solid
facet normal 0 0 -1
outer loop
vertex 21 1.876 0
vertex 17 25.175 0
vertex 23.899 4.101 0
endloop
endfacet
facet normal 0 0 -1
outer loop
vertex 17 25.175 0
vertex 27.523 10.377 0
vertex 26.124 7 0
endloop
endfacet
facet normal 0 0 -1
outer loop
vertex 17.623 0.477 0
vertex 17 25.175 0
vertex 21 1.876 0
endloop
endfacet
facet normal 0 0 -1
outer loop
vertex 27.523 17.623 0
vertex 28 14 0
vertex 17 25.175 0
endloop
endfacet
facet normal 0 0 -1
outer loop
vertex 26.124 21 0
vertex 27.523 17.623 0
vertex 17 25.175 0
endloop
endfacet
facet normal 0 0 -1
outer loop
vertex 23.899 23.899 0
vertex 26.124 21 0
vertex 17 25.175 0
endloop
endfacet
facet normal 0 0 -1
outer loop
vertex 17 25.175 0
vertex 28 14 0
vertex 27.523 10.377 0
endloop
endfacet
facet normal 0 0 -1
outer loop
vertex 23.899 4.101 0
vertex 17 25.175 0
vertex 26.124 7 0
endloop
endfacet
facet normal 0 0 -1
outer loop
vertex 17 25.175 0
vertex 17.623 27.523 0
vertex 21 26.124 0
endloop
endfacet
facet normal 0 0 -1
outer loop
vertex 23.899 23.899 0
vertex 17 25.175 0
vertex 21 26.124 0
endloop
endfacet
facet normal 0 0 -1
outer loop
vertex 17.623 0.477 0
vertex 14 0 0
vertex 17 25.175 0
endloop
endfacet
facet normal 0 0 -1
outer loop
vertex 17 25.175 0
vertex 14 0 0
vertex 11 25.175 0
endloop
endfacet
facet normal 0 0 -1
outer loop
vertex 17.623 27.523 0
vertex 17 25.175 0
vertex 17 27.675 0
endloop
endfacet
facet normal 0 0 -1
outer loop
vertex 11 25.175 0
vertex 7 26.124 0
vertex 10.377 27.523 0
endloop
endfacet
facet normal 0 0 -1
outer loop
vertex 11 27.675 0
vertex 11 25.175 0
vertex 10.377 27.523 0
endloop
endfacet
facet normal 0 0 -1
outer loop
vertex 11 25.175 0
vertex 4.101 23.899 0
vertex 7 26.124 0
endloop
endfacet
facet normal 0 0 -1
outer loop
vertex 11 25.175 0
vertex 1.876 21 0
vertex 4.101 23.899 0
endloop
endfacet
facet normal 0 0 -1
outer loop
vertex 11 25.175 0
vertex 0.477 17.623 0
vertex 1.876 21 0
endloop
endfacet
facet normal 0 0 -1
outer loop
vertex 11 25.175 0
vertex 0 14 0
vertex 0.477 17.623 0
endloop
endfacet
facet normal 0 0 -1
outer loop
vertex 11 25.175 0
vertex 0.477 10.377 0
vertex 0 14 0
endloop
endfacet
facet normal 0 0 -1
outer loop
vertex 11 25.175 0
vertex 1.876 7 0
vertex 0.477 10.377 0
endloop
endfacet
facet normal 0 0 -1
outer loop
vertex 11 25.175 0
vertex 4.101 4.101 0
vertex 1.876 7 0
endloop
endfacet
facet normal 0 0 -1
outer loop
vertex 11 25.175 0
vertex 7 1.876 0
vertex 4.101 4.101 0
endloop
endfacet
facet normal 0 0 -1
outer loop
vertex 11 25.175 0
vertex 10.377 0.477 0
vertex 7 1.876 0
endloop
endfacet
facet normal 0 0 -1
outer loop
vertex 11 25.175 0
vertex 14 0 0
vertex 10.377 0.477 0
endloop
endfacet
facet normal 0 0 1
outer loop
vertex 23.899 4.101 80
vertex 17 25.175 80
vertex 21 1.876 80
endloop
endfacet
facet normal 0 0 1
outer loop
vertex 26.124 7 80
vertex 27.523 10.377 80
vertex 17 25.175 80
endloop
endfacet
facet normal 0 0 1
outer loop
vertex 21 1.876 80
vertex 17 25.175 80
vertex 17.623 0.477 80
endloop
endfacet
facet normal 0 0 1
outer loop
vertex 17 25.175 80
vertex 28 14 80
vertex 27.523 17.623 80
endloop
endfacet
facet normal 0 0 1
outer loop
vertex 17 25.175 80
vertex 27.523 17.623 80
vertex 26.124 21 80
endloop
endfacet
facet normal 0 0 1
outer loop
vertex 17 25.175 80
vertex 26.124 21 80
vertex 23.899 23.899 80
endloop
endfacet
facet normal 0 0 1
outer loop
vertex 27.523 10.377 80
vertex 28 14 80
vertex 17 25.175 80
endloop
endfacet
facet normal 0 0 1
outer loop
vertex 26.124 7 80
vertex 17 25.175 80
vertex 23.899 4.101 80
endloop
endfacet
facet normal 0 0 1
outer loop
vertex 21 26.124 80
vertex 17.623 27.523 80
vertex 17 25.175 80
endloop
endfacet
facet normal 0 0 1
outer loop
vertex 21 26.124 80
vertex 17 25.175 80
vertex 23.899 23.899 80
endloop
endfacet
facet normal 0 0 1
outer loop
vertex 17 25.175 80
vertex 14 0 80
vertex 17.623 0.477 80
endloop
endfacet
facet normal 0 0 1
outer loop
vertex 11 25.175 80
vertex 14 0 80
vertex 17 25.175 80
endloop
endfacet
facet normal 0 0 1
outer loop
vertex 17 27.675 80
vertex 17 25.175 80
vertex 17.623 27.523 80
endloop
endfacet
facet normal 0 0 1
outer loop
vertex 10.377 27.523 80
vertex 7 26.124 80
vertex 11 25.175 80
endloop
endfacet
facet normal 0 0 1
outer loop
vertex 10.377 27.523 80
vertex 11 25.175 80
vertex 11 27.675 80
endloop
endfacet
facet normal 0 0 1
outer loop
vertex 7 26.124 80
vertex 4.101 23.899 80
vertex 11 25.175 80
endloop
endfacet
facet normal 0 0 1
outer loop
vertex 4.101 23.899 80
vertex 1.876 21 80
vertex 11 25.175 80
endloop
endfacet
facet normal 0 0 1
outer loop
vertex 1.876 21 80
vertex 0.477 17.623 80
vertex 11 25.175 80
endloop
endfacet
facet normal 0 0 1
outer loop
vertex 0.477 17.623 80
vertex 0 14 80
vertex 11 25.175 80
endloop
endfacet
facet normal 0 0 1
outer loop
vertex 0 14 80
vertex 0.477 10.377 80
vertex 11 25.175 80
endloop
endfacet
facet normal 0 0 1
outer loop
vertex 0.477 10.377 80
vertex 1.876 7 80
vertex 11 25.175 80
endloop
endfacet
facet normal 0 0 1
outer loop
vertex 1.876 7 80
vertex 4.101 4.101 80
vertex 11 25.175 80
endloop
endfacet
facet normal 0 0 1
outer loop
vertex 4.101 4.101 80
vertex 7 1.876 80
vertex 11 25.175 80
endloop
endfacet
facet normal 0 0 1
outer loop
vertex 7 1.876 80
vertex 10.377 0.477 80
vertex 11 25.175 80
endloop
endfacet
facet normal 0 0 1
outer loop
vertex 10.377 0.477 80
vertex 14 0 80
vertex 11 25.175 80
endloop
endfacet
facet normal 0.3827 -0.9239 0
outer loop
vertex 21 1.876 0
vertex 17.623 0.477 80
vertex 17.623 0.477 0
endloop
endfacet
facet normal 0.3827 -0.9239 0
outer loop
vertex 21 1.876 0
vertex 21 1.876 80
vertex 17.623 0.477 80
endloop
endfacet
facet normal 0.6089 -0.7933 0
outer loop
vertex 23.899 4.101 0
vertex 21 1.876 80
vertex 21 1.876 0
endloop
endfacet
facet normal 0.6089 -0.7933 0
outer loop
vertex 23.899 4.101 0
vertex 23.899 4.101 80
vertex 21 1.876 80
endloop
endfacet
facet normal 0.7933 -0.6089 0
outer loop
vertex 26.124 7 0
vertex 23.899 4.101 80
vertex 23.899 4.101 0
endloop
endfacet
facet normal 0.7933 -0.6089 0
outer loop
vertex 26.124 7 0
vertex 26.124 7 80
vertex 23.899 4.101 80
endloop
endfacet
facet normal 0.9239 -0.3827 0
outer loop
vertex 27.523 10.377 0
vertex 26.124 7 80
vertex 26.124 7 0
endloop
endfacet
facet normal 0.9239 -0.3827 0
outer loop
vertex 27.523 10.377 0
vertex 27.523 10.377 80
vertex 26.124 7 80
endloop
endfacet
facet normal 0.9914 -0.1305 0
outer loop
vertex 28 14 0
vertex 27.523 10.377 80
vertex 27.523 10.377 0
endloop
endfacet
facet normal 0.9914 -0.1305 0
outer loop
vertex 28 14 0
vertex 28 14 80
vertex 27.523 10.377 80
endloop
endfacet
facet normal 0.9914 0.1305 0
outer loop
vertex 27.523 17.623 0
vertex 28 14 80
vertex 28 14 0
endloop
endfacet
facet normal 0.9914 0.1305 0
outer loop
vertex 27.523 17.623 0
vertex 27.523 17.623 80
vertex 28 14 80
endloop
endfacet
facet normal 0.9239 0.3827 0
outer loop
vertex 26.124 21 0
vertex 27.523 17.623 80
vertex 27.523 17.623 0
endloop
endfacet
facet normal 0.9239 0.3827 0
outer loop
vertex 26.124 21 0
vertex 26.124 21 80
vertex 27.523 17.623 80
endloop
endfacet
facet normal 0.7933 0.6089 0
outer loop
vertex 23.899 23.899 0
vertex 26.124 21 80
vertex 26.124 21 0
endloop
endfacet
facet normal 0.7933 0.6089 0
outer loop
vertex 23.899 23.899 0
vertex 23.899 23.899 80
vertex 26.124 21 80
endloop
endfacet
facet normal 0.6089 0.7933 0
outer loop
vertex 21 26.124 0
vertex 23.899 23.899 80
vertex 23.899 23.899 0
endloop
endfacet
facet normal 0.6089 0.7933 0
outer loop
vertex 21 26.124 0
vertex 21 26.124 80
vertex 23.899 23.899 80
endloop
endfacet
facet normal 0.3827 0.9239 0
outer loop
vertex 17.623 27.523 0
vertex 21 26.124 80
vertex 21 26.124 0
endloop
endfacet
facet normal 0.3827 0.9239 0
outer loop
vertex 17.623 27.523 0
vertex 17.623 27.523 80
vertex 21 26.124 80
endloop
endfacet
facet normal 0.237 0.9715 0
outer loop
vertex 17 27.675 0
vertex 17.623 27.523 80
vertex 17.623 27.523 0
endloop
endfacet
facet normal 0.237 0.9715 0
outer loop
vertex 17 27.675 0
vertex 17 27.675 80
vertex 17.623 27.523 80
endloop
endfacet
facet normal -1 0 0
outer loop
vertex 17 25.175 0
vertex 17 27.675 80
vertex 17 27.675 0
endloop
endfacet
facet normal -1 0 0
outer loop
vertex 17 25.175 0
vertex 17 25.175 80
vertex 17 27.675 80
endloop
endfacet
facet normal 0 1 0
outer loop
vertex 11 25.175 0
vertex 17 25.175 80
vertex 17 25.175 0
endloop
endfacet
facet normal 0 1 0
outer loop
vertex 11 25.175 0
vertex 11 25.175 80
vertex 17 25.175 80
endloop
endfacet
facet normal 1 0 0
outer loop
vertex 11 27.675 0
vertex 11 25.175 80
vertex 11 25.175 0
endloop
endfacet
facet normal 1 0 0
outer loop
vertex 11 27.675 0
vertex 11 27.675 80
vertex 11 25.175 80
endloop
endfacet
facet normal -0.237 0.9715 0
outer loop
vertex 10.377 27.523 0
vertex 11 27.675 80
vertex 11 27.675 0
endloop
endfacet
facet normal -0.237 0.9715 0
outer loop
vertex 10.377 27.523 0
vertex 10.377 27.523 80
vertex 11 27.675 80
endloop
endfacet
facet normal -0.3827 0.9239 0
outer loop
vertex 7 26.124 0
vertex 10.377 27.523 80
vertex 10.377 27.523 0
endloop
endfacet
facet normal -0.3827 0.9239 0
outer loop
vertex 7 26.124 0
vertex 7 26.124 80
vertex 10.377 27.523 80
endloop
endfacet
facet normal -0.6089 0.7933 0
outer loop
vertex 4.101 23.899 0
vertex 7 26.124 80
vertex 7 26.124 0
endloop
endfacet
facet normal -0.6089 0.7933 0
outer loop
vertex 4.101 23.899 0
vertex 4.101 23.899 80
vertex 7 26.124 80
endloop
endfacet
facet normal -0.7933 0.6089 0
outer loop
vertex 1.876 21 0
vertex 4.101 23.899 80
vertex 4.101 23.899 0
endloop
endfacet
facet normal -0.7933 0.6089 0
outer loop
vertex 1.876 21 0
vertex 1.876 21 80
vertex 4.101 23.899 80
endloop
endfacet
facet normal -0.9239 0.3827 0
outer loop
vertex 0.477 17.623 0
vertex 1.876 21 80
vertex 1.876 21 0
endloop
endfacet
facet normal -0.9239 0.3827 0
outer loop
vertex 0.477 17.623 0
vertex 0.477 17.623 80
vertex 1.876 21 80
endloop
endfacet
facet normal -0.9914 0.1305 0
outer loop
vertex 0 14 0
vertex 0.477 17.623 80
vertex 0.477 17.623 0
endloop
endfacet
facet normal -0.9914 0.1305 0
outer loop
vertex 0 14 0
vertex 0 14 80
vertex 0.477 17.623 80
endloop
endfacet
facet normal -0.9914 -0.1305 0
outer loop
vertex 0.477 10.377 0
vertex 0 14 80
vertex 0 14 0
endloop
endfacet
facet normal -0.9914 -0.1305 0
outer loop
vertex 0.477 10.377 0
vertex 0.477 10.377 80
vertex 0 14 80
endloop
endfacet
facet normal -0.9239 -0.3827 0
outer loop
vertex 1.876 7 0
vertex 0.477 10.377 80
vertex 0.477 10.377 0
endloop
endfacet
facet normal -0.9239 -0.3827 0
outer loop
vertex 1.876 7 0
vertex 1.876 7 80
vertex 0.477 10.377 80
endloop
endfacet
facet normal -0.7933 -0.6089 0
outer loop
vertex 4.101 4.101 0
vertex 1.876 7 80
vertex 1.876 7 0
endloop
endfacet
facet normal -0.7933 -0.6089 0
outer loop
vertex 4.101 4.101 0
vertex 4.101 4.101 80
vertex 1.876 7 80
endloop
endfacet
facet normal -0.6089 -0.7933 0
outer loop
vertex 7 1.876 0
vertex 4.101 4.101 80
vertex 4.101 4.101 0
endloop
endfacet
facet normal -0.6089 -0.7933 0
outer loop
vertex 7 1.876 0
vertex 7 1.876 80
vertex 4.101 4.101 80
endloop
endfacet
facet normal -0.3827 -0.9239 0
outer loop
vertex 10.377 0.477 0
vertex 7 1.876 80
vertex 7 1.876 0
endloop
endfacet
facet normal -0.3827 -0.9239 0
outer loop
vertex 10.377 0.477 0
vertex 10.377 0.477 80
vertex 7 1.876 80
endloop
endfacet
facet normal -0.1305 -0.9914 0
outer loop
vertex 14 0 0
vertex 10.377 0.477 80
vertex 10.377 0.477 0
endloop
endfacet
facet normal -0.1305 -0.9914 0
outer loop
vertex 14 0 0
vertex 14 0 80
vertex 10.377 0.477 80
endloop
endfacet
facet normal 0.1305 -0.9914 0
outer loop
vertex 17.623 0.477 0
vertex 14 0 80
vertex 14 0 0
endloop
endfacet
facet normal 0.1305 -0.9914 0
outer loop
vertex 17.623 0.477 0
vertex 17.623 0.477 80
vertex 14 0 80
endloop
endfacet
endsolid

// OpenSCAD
$fn = 32;

// ----------------------------------------------------------------------
// Keyway shaft: d28 shaft, key 6 x 2.5 mm
// ----------------------------------------------------------------------

// --- parameters (mm) ---
shaft_r = 14;             // shaft radius
key_w = 6;                // keyway width
key_d = 2.5;              // keyway depth below the surface line
plate_t = 80;             // shaft length, Z (extrusion height)

shaft_d = 2 * shaft_r;  // shaft diameter
circle_step = 15;  // polygon sampling step, degrees

profile = [[10.377, 27.523], [7, 26.124], [4.101, 23.899], [1.876, 21], [0.477, 17.623], [0, 14], [0.477, 10.377], [1.876, 7], [4.101, 4.101], [7, 1.876], [10.377, 0.477], [14, 0], [17.623, 0.477], [21, 1.876], [23.899, 4.101], [26.124, 7], [27.523, 10.377], [28, 14], [27.523, 17.623], [26.124, 21], [23.899, 23.899], [21, 26.124], [17.623, 27.523], [17, 27.675], [17, 25.175], [11, 25.175], [11, 27.675]];  // primary outline, 27 points, counter clockwise

// --- the one profile operation ---
linear_extrude(height = plate_t) polygon(points = profile);
